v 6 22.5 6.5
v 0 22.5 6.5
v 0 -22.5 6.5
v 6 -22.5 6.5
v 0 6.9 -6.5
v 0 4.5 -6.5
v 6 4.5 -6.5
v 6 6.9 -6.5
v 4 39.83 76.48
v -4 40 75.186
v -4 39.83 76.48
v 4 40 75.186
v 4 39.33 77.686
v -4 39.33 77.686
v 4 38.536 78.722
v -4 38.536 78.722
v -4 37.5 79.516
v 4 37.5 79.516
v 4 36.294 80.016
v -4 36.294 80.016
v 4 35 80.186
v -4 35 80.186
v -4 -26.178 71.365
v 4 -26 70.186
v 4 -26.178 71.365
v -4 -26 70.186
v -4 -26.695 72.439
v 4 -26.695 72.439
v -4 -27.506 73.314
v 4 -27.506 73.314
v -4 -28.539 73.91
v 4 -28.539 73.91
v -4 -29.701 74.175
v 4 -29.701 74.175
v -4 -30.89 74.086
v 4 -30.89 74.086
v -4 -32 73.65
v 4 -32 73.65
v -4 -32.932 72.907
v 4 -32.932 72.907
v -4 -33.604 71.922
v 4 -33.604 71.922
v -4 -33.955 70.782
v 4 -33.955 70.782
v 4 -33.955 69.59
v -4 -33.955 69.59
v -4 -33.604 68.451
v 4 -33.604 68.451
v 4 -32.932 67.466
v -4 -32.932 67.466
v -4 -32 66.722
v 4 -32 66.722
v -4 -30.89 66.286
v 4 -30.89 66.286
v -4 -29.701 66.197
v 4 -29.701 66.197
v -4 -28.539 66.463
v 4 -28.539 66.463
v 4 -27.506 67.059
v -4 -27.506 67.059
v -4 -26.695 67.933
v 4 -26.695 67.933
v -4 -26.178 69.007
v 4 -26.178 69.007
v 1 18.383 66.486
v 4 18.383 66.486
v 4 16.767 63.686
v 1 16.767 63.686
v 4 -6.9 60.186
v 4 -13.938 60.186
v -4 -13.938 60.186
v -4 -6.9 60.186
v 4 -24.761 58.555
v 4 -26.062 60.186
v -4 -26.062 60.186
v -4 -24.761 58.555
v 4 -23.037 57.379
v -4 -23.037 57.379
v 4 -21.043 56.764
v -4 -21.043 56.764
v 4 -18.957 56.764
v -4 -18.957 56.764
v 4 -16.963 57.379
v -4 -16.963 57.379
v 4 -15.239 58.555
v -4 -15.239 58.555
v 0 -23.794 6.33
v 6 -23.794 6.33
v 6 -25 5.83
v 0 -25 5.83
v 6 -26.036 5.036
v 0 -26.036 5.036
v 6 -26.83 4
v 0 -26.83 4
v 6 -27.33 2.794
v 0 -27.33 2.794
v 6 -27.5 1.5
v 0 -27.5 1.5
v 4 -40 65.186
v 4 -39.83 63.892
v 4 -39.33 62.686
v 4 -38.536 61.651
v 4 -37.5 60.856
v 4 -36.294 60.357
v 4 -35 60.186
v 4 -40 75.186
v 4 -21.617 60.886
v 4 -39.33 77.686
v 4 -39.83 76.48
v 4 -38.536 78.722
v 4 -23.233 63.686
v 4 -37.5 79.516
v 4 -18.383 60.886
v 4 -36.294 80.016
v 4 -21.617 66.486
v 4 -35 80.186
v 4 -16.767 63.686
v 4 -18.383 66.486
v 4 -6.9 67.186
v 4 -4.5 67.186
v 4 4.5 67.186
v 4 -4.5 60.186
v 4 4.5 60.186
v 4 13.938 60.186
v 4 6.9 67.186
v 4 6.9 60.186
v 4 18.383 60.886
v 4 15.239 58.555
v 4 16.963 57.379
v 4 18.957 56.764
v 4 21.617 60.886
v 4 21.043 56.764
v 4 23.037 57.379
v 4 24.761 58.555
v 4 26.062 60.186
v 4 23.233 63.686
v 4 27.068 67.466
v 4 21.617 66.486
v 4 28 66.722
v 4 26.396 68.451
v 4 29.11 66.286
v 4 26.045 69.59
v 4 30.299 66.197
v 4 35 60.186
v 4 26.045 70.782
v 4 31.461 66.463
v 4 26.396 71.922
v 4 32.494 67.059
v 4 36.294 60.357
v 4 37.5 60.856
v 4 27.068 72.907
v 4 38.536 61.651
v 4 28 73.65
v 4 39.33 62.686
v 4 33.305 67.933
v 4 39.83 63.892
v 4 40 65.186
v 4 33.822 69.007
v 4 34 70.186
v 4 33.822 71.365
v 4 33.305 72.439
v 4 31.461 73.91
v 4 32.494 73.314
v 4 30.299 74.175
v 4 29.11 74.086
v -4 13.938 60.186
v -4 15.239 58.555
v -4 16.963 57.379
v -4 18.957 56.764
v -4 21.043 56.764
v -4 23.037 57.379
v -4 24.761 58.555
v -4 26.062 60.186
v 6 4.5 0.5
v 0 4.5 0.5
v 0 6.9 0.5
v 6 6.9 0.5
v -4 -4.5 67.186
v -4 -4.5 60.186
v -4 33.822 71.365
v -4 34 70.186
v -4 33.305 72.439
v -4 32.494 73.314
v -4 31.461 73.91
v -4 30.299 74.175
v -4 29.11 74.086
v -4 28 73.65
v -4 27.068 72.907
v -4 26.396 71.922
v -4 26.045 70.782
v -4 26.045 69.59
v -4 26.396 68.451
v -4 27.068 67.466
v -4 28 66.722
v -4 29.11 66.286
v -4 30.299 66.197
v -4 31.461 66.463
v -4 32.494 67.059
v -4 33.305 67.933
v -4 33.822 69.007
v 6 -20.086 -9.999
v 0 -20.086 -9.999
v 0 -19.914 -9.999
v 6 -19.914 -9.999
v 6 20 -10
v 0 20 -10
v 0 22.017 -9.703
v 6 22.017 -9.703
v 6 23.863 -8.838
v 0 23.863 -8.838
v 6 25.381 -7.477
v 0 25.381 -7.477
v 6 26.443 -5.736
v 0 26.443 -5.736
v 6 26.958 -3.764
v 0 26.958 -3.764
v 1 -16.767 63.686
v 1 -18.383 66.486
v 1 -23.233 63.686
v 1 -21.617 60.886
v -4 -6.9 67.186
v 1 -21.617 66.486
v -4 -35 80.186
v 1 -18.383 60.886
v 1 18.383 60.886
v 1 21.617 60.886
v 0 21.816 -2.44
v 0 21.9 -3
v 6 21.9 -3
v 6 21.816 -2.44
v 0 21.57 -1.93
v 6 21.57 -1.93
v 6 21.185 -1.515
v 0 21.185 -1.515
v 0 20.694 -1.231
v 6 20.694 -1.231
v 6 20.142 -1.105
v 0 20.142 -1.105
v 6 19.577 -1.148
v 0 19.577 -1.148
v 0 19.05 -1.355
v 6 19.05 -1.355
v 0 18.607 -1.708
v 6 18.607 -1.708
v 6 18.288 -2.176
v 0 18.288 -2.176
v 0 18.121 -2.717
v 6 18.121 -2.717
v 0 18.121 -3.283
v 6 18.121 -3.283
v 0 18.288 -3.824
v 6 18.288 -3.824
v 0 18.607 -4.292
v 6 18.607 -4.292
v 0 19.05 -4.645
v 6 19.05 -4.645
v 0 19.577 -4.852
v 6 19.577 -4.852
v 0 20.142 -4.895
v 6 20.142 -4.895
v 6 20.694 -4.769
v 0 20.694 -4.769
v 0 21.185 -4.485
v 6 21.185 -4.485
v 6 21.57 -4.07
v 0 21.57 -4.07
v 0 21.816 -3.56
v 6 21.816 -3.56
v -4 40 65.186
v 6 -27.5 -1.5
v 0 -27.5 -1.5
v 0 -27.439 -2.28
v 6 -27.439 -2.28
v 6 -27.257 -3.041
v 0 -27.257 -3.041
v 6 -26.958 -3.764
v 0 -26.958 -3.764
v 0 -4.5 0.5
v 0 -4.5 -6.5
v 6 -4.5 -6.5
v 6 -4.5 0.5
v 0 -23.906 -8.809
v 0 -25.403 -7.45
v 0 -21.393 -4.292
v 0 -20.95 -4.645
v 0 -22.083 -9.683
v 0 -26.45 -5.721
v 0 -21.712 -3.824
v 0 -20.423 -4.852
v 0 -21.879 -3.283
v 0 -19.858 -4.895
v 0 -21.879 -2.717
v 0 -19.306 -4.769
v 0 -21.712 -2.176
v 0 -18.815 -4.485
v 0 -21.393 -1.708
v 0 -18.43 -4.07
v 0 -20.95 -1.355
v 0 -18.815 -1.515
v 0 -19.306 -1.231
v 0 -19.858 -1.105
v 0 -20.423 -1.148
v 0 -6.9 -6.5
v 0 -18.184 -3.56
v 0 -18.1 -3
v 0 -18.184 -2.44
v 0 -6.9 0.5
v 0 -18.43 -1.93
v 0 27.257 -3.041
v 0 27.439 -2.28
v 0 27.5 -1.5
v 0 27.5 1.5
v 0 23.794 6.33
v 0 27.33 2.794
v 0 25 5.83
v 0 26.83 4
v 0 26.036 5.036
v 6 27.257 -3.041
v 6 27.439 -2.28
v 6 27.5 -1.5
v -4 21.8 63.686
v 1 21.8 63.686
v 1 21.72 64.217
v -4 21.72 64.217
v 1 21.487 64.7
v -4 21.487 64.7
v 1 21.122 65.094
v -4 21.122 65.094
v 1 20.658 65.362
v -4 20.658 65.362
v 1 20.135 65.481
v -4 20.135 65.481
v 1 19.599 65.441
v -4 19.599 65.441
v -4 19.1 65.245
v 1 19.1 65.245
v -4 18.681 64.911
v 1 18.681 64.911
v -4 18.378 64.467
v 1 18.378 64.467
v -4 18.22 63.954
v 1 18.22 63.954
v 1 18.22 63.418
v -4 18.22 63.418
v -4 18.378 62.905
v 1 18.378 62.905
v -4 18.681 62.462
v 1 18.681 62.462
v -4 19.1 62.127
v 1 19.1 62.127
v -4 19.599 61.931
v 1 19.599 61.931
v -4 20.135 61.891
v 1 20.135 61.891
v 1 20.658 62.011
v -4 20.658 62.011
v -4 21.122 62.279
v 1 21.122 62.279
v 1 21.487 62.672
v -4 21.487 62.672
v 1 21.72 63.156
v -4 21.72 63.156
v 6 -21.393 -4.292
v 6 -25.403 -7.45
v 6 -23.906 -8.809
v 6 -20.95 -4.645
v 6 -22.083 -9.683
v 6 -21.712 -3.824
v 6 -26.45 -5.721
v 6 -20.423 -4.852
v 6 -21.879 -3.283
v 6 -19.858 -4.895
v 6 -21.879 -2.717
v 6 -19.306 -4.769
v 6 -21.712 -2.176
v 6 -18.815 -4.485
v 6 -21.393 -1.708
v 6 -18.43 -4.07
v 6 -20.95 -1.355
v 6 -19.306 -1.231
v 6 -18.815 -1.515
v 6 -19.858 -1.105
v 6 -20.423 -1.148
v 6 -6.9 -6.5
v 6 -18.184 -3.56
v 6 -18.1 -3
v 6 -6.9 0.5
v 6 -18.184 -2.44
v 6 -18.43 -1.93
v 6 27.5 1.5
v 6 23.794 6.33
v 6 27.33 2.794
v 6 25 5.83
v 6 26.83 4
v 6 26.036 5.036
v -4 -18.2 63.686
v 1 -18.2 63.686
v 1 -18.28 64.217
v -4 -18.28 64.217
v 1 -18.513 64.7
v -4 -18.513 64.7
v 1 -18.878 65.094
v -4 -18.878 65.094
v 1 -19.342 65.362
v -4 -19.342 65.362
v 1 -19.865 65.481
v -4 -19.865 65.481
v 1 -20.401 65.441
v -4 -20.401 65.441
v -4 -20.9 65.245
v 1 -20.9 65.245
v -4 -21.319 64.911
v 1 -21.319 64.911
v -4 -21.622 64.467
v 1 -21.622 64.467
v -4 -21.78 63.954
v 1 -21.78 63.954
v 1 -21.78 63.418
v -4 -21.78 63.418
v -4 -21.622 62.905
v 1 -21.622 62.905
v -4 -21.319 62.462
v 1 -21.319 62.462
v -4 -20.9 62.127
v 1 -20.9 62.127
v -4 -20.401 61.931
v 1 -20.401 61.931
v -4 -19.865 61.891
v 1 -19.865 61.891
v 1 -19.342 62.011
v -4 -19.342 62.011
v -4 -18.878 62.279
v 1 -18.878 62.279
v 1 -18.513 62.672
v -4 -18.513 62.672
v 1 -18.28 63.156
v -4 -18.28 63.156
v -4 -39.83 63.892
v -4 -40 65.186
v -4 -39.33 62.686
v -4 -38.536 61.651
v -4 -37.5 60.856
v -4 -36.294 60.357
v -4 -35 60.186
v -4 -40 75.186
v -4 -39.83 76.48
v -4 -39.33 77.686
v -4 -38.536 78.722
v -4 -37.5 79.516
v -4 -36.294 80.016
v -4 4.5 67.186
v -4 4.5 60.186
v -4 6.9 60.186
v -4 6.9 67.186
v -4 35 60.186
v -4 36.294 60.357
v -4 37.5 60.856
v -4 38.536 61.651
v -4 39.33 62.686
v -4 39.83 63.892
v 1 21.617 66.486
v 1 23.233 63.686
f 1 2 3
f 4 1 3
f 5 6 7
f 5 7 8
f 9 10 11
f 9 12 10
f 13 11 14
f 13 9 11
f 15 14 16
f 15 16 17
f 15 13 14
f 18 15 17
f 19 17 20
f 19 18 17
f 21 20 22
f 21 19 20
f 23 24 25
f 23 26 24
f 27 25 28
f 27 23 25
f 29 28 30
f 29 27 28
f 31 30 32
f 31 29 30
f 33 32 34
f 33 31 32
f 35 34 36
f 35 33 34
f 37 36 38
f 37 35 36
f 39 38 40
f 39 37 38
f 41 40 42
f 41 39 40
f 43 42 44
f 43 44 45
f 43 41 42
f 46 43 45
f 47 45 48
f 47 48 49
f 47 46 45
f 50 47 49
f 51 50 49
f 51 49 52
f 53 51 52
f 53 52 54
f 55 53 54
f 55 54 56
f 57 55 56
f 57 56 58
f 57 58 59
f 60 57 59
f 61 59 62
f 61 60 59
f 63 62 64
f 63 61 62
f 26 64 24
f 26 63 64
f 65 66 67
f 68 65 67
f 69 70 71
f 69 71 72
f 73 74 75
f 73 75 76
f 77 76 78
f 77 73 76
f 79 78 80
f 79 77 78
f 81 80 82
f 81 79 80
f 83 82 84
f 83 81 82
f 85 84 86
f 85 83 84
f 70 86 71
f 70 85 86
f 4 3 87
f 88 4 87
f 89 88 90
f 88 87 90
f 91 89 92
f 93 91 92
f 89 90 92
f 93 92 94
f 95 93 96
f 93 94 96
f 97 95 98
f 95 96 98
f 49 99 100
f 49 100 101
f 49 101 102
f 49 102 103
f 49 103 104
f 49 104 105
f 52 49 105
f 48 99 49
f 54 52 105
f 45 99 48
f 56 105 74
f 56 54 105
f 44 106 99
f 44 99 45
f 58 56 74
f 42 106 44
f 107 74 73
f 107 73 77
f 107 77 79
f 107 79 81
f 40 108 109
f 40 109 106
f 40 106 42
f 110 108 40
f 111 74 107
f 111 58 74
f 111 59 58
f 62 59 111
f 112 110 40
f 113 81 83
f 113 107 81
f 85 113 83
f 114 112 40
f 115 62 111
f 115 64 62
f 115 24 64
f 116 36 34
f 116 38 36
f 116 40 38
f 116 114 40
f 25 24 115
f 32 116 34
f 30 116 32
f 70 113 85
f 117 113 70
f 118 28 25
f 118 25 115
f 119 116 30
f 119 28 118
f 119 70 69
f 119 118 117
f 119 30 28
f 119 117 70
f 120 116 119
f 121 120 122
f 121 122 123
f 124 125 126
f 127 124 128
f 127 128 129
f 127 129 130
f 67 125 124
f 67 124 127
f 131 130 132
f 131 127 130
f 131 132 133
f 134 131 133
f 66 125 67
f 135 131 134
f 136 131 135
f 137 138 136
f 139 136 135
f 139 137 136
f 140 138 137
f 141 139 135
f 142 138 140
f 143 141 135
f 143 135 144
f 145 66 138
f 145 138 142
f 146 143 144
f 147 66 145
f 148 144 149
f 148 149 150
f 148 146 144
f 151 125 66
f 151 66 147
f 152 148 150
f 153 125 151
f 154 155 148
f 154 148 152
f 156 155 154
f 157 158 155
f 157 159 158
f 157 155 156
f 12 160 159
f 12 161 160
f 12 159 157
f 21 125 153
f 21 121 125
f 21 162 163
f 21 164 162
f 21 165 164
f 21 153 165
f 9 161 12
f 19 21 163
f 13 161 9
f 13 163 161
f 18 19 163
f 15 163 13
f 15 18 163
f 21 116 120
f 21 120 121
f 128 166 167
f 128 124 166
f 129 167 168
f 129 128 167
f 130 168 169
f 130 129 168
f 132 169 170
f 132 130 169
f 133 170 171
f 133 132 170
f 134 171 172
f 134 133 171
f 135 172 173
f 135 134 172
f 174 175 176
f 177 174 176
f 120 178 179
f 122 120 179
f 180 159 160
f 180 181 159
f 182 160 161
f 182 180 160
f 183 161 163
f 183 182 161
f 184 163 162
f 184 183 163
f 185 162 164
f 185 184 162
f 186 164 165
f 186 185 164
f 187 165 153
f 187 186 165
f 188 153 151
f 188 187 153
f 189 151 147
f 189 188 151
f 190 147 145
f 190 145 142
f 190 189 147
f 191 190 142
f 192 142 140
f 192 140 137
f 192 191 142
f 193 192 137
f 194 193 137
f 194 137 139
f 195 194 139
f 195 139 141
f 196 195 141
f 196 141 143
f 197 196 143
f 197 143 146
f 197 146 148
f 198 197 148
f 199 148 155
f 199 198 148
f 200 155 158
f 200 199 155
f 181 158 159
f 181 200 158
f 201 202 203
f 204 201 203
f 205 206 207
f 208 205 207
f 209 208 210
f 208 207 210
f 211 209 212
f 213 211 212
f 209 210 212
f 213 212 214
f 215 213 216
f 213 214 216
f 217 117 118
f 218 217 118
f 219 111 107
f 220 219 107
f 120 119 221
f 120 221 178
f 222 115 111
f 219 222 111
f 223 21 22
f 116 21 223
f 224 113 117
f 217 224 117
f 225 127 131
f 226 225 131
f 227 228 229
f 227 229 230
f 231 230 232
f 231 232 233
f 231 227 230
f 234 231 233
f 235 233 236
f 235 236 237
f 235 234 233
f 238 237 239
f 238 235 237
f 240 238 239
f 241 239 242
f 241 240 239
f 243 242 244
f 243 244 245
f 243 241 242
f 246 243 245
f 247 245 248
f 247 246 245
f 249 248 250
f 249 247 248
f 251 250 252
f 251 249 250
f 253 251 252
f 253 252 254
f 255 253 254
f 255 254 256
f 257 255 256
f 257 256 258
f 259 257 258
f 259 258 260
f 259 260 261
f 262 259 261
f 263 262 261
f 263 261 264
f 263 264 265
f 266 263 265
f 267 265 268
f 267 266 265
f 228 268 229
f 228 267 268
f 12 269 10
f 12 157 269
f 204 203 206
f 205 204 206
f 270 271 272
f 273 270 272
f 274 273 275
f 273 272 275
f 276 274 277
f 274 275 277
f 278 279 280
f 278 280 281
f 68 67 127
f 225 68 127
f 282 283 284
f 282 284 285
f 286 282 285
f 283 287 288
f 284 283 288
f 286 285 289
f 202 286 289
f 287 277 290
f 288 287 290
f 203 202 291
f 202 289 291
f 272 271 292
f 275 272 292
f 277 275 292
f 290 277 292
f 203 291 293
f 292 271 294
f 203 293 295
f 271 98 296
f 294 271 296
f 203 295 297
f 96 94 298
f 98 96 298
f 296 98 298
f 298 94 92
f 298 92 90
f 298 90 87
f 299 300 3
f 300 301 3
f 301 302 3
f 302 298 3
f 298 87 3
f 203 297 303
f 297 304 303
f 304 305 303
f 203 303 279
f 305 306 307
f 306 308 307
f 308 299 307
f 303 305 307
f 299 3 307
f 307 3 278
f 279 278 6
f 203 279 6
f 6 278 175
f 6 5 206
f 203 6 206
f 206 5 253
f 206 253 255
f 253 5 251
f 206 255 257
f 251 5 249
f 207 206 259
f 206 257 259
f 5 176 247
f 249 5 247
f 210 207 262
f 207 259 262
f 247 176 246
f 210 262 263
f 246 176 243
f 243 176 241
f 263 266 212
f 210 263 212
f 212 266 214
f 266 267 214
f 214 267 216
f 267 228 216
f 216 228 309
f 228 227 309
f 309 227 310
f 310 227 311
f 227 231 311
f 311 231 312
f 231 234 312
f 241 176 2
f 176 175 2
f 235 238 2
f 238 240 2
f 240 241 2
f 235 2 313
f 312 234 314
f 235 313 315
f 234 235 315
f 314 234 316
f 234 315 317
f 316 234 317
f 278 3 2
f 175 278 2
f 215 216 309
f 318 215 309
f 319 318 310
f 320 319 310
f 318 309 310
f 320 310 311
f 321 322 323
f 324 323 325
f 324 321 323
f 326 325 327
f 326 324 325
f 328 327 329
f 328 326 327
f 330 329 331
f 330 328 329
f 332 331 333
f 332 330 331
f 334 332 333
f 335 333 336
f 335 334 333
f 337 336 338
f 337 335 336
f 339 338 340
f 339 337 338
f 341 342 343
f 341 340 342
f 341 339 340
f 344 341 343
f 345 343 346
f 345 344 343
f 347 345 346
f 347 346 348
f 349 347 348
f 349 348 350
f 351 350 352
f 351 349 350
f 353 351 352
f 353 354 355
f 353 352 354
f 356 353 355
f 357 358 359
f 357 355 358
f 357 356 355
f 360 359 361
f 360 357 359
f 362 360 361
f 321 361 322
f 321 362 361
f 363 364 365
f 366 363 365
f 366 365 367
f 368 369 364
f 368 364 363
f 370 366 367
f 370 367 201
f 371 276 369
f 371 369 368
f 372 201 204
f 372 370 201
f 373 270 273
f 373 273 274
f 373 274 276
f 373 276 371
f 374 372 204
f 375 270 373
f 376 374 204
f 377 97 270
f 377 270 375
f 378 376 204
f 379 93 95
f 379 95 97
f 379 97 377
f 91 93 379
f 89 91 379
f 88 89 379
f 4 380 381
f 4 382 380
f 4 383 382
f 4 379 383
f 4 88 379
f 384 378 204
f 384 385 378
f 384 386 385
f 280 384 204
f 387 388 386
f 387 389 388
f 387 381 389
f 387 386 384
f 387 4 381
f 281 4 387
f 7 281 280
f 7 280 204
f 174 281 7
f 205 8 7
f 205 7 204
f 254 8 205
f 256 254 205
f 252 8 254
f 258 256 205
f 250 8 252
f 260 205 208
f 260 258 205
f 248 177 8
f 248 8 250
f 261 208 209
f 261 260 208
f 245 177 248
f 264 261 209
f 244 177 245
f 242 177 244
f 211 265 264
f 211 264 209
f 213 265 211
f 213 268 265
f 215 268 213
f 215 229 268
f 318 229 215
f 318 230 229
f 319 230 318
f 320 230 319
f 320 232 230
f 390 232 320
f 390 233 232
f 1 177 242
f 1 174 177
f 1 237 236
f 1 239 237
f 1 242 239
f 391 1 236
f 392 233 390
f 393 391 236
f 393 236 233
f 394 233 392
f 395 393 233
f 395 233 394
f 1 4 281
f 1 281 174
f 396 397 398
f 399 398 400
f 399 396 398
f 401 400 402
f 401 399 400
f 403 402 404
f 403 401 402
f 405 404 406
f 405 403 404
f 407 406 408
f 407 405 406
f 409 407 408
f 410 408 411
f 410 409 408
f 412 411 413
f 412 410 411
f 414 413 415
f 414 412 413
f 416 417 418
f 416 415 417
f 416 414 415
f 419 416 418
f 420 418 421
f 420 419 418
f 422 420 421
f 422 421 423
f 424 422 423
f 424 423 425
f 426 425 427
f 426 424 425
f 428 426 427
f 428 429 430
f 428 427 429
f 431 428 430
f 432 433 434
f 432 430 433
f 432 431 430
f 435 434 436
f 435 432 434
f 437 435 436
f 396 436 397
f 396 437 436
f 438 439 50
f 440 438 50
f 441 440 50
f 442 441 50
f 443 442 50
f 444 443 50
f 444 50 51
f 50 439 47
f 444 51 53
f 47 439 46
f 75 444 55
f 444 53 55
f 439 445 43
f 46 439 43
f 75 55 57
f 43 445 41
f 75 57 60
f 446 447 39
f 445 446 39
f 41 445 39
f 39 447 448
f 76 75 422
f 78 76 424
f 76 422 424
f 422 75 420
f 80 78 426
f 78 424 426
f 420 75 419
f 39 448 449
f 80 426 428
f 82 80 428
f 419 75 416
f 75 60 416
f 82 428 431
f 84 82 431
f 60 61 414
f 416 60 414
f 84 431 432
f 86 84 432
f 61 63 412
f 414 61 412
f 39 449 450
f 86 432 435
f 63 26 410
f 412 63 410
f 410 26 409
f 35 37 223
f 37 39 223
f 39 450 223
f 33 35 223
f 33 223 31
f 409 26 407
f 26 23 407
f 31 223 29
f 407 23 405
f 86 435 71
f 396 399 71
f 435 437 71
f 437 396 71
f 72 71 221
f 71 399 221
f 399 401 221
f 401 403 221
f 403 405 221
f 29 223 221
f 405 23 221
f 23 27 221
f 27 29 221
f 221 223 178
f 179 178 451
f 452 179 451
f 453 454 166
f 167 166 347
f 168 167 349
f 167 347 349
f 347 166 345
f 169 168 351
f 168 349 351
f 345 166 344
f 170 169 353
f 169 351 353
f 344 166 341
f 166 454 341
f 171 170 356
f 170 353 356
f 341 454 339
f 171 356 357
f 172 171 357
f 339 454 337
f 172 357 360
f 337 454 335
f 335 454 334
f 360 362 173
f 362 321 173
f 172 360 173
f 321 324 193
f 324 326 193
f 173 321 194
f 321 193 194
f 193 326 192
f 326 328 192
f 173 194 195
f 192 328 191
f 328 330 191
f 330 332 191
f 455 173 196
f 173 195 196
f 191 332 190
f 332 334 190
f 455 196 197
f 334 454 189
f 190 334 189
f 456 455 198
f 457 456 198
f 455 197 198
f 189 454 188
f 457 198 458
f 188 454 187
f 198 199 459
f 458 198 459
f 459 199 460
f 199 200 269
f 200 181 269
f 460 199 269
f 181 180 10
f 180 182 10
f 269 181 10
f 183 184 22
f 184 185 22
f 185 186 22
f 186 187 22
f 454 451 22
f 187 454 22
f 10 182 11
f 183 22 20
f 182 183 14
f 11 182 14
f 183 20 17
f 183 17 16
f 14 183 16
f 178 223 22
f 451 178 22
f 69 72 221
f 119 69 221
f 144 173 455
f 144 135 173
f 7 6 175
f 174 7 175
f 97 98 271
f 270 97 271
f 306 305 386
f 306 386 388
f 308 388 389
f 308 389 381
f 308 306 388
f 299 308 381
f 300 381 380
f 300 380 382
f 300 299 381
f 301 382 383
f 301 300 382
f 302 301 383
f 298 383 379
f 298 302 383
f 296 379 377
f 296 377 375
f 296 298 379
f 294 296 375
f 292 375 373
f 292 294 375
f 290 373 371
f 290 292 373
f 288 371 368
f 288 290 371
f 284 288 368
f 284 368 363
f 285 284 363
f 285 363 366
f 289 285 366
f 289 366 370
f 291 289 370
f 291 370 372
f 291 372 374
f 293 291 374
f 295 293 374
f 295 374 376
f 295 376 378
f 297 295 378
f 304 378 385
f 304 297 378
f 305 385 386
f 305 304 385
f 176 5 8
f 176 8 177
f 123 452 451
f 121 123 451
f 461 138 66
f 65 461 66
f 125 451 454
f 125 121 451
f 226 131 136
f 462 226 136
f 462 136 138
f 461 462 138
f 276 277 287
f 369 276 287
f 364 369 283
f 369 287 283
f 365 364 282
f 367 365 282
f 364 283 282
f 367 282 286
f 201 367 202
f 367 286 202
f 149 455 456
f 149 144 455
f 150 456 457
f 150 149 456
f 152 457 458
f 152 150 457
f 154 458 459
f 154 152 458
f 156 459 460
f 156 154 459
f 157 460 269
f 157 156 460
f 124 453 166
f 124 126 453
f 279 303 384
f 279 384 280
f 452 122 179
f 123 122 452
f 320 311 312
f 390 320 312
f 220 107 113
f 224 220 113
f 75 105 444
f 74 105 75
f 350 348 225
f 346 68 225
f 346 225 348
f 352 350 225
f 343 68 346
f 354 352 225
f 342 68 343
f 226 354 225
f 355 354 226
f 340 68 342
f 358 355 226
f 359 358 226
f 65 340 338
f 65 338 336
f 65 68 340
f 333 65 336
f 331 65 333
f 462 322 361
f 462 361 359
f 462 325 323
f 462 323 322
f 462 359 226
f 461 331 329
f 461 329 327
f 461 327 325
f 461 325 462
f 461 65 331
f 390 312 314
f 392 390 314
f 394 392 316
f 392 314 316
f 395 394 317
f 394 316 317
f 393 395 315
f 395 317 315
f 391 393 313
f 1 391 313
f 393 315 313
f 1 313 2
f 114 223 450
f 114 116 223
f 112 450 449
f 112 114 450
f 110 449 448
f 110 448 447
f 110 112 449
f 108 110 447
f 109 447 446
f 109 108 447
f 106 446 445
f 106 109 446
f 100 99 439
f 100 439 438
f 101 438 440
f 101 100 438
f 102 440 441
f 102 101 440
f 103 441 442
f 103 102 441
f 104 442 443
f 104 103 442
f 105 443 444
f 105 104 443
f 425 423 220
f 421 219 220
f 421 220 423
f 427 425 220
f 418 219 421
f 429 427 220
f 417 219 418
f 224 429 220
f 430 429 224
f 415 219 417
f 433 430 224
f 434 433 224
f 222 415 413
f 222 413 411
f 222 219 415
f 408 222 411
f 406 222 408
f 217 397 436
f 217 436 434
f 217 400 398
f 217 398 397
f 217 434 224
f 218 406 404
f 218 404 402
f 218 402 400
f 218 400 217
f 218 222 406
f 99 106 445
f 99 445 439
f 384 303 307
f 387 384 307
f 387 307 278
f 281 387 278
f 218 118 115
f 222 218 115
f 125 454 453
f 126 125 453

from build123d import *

# Parameters (mm, degrees)
F1_DEPTH = 4
F2_R     = 1.4
F3_DEPTH = 13
F4_R     = 1.8
F4_R_2   = 4
F5_DEPTH = 4
F7_DEPTH = 3
F8_R     = 1.9
F8_W     = 2.4
F8_H     = 7
F9_DEPTH = 6


with BuildPart() as f1:
    # F0 (on Right) → F1 (new body, symmetric)
    with BuildSketch(Plane.YZ):
        with BuildLine():
            Line((11, 25), (-11, 25))
            Line((-11, 25), (-11, 10))
            ThreePointArc((-11, 10), (-10.414214, 8.585786), (-9, 8))
            Line((-9, 8), (9, 8))
            ThreePointArc((9, 8), (10.414214, 8.585786), (11, 10))
            Line((11, 10), (11, 25))
        make_face()
    extrude(amount=F1_DEPTH, both=True)

    # F2 (on face) → F3 (cut)
    with BuildSketch(Plane.XY.offset(25)):
        with Locations((0, 30)):
            Circle(F2_R)
        with Locations((0, 24)):
            Circle(F2_R)
        with Locations((0, -24)):
            Circle(F2_R)
        with Locations((0, -30)):
            Circle(F2_R)
    extrude(amount=-F3_DEPTH, mode=Mode.SUBTRACT)


with BuildPart() as f5:
    # F4 (on Right) → F5 (new body, symmetric)
    with BuildSketch(Plane.YZ):
        with BuildLine():
            Line((-11, 80.186208), (-35, 80.186208))
            ThreePointArc((-35, 80.186208), (-38.535534, 78.721742), (-40, 75.186208))
            Line((-40, 75.186208), (-40, 65.186208))
            ThreePointArc((-40, 65.186208), (-38.535534, 61.650674), (-35, 60.186208))
            Line((-35, 60.186208), (-26.062178, 60.186208))
            ThreePointArc((-26.062178, 60.186208), (-20, 56.686208), (-13.937822, 60.186208))
            Line((-13.937822, 60.186208), (-6.9, 60.186208))
            Line((-6.9, 60.186208), (-6.9, 67.186208))
            Line((-6.9, 67.186208), (-4.5, 67.186208))
            Line((-4.5, 67.186208), (-4.5, 60.186208))
            Line((-4.5, 60.186208), (4.5, 60.186208))
            Line((4.5, 60.186208), (4.5, 67.186208))
            Line((4.5, 67.186208), (6.9, 67.186208))
            Line((6.9, 67.186208), (6.9, 60.186208))
            Line((6.9, 60.186208), (13.937822, 60.186208))
            ThreePointArc((13.937822, 60.186208), (20, 56.686208), (26.062178, 60.186208))
            Line((26.062178, 60.186208), (35, 60.186208))
            ThreePointArc((35, 60.186208), (38.535534, 61.650674), (40, 65.186208))
            Line((40, 65.186208), (40, 75.186208))
            ThreePointArc((40, 75.186208), (38.535534, 78.721742), (35, 80.186208))
            Line((35, 80.186208), (11, 80.186208))
            Line((11, 80.186208), (-11, 80.186208))
        make_face()
        with Locations((-20, 63.686208)):
            Circle(F4_R, mode=Mode.SUBTRACT)
        with Locations((20, 63.686208)):
            Circle(F4_R, mode=Mode.SUBTRACT)
        with Locations((-30, 70.186208)):
            Circle(F4_R_2, mode=Mode.SUBTRACT)
        with Locations((30, 70.186208)):
            Circle(F4_R_2, mode=Mode.SUBTRACT)
    extrude(amount=F5_DEPTH, both=True)

    # F6 (on face) → F7 (cut)
    with BuildSketch(Plane.YZ.offset(4)):
        Polygon((21.616581, 66.486208), (18.383419, 66.486208), (16.766838, 63.686208), (18.383419, 60.886208), (21.616581, 60.886208), (23.233162, 63.686208), align=None)
        Polygon((-18.383419, 66.486208), (-21.616581, 66.486208), (-23.233162, 63.686208), (-21.616581, 60.886208), (-18.383419, 60.886208), (-16.766838, 63.686208), align=None)
    extrude(amount=-F7_DEPTH, mode=Mode.SUBTRACT)


with BuildPart() as f9:
    # F8 (on Right) → F9 (new body)
    with BuildSketch(Plane.YZ):
        with BuildLine():
            Line((22.5, 6.5), (-22.5, 6.5))
            ThreePointArc((-22.5, 6.5), (-26.035534, 5.035534), (-27.5, 1.5))
            Line((-27.5, 1.5), (-27.5, -1.5))
            ThreePointArc((-27.5, -1.5), (-27.362668, -2.663813), (-26.958216, -3.763694))
            ThreePointArc((-26.958216, -3.763694), (-24.703816, -8.184025), (-20.08583, -9.999474))
            Line((-20.08583, -9.999474), (-19.914354, -9.999476))
            Line((-19.914354, -9.999476), (19.999908, -10))
            ThreePointArc((19.999908, -10), (24.671911, -8.212796), (26.958216, -3.763694))
            ThreePointArc((26.958216, -3.763694), (27.362668, -2.663813), (27.5, -1.5))
            Line((27.5, -1.5), (27.5, 1.5))
            ThreePointArc((27.5, 1.5), (26.035534, 5.035534), (22.5, 6.5))
        make_face()
        with Locations((-20, -3)):
            Circle(F8_R, mode=Mode.SUBTRACT)
        with Locations((-5.7, -3)):
            Rectangle(F8_W, F8_H, mode=Mode.SUBTRACT)
        with Locations((5.7, -3)):
            Rectangle(F8_W, F8_H, mode=Mode.SUBTRACT)
        with Locations((20, -3)):
            Circle(F8_R, mode=Mode.SUBTRACT)
    extrude(amount=F9_DEPTH)


solid = Compound([f5.part, f9.part])
